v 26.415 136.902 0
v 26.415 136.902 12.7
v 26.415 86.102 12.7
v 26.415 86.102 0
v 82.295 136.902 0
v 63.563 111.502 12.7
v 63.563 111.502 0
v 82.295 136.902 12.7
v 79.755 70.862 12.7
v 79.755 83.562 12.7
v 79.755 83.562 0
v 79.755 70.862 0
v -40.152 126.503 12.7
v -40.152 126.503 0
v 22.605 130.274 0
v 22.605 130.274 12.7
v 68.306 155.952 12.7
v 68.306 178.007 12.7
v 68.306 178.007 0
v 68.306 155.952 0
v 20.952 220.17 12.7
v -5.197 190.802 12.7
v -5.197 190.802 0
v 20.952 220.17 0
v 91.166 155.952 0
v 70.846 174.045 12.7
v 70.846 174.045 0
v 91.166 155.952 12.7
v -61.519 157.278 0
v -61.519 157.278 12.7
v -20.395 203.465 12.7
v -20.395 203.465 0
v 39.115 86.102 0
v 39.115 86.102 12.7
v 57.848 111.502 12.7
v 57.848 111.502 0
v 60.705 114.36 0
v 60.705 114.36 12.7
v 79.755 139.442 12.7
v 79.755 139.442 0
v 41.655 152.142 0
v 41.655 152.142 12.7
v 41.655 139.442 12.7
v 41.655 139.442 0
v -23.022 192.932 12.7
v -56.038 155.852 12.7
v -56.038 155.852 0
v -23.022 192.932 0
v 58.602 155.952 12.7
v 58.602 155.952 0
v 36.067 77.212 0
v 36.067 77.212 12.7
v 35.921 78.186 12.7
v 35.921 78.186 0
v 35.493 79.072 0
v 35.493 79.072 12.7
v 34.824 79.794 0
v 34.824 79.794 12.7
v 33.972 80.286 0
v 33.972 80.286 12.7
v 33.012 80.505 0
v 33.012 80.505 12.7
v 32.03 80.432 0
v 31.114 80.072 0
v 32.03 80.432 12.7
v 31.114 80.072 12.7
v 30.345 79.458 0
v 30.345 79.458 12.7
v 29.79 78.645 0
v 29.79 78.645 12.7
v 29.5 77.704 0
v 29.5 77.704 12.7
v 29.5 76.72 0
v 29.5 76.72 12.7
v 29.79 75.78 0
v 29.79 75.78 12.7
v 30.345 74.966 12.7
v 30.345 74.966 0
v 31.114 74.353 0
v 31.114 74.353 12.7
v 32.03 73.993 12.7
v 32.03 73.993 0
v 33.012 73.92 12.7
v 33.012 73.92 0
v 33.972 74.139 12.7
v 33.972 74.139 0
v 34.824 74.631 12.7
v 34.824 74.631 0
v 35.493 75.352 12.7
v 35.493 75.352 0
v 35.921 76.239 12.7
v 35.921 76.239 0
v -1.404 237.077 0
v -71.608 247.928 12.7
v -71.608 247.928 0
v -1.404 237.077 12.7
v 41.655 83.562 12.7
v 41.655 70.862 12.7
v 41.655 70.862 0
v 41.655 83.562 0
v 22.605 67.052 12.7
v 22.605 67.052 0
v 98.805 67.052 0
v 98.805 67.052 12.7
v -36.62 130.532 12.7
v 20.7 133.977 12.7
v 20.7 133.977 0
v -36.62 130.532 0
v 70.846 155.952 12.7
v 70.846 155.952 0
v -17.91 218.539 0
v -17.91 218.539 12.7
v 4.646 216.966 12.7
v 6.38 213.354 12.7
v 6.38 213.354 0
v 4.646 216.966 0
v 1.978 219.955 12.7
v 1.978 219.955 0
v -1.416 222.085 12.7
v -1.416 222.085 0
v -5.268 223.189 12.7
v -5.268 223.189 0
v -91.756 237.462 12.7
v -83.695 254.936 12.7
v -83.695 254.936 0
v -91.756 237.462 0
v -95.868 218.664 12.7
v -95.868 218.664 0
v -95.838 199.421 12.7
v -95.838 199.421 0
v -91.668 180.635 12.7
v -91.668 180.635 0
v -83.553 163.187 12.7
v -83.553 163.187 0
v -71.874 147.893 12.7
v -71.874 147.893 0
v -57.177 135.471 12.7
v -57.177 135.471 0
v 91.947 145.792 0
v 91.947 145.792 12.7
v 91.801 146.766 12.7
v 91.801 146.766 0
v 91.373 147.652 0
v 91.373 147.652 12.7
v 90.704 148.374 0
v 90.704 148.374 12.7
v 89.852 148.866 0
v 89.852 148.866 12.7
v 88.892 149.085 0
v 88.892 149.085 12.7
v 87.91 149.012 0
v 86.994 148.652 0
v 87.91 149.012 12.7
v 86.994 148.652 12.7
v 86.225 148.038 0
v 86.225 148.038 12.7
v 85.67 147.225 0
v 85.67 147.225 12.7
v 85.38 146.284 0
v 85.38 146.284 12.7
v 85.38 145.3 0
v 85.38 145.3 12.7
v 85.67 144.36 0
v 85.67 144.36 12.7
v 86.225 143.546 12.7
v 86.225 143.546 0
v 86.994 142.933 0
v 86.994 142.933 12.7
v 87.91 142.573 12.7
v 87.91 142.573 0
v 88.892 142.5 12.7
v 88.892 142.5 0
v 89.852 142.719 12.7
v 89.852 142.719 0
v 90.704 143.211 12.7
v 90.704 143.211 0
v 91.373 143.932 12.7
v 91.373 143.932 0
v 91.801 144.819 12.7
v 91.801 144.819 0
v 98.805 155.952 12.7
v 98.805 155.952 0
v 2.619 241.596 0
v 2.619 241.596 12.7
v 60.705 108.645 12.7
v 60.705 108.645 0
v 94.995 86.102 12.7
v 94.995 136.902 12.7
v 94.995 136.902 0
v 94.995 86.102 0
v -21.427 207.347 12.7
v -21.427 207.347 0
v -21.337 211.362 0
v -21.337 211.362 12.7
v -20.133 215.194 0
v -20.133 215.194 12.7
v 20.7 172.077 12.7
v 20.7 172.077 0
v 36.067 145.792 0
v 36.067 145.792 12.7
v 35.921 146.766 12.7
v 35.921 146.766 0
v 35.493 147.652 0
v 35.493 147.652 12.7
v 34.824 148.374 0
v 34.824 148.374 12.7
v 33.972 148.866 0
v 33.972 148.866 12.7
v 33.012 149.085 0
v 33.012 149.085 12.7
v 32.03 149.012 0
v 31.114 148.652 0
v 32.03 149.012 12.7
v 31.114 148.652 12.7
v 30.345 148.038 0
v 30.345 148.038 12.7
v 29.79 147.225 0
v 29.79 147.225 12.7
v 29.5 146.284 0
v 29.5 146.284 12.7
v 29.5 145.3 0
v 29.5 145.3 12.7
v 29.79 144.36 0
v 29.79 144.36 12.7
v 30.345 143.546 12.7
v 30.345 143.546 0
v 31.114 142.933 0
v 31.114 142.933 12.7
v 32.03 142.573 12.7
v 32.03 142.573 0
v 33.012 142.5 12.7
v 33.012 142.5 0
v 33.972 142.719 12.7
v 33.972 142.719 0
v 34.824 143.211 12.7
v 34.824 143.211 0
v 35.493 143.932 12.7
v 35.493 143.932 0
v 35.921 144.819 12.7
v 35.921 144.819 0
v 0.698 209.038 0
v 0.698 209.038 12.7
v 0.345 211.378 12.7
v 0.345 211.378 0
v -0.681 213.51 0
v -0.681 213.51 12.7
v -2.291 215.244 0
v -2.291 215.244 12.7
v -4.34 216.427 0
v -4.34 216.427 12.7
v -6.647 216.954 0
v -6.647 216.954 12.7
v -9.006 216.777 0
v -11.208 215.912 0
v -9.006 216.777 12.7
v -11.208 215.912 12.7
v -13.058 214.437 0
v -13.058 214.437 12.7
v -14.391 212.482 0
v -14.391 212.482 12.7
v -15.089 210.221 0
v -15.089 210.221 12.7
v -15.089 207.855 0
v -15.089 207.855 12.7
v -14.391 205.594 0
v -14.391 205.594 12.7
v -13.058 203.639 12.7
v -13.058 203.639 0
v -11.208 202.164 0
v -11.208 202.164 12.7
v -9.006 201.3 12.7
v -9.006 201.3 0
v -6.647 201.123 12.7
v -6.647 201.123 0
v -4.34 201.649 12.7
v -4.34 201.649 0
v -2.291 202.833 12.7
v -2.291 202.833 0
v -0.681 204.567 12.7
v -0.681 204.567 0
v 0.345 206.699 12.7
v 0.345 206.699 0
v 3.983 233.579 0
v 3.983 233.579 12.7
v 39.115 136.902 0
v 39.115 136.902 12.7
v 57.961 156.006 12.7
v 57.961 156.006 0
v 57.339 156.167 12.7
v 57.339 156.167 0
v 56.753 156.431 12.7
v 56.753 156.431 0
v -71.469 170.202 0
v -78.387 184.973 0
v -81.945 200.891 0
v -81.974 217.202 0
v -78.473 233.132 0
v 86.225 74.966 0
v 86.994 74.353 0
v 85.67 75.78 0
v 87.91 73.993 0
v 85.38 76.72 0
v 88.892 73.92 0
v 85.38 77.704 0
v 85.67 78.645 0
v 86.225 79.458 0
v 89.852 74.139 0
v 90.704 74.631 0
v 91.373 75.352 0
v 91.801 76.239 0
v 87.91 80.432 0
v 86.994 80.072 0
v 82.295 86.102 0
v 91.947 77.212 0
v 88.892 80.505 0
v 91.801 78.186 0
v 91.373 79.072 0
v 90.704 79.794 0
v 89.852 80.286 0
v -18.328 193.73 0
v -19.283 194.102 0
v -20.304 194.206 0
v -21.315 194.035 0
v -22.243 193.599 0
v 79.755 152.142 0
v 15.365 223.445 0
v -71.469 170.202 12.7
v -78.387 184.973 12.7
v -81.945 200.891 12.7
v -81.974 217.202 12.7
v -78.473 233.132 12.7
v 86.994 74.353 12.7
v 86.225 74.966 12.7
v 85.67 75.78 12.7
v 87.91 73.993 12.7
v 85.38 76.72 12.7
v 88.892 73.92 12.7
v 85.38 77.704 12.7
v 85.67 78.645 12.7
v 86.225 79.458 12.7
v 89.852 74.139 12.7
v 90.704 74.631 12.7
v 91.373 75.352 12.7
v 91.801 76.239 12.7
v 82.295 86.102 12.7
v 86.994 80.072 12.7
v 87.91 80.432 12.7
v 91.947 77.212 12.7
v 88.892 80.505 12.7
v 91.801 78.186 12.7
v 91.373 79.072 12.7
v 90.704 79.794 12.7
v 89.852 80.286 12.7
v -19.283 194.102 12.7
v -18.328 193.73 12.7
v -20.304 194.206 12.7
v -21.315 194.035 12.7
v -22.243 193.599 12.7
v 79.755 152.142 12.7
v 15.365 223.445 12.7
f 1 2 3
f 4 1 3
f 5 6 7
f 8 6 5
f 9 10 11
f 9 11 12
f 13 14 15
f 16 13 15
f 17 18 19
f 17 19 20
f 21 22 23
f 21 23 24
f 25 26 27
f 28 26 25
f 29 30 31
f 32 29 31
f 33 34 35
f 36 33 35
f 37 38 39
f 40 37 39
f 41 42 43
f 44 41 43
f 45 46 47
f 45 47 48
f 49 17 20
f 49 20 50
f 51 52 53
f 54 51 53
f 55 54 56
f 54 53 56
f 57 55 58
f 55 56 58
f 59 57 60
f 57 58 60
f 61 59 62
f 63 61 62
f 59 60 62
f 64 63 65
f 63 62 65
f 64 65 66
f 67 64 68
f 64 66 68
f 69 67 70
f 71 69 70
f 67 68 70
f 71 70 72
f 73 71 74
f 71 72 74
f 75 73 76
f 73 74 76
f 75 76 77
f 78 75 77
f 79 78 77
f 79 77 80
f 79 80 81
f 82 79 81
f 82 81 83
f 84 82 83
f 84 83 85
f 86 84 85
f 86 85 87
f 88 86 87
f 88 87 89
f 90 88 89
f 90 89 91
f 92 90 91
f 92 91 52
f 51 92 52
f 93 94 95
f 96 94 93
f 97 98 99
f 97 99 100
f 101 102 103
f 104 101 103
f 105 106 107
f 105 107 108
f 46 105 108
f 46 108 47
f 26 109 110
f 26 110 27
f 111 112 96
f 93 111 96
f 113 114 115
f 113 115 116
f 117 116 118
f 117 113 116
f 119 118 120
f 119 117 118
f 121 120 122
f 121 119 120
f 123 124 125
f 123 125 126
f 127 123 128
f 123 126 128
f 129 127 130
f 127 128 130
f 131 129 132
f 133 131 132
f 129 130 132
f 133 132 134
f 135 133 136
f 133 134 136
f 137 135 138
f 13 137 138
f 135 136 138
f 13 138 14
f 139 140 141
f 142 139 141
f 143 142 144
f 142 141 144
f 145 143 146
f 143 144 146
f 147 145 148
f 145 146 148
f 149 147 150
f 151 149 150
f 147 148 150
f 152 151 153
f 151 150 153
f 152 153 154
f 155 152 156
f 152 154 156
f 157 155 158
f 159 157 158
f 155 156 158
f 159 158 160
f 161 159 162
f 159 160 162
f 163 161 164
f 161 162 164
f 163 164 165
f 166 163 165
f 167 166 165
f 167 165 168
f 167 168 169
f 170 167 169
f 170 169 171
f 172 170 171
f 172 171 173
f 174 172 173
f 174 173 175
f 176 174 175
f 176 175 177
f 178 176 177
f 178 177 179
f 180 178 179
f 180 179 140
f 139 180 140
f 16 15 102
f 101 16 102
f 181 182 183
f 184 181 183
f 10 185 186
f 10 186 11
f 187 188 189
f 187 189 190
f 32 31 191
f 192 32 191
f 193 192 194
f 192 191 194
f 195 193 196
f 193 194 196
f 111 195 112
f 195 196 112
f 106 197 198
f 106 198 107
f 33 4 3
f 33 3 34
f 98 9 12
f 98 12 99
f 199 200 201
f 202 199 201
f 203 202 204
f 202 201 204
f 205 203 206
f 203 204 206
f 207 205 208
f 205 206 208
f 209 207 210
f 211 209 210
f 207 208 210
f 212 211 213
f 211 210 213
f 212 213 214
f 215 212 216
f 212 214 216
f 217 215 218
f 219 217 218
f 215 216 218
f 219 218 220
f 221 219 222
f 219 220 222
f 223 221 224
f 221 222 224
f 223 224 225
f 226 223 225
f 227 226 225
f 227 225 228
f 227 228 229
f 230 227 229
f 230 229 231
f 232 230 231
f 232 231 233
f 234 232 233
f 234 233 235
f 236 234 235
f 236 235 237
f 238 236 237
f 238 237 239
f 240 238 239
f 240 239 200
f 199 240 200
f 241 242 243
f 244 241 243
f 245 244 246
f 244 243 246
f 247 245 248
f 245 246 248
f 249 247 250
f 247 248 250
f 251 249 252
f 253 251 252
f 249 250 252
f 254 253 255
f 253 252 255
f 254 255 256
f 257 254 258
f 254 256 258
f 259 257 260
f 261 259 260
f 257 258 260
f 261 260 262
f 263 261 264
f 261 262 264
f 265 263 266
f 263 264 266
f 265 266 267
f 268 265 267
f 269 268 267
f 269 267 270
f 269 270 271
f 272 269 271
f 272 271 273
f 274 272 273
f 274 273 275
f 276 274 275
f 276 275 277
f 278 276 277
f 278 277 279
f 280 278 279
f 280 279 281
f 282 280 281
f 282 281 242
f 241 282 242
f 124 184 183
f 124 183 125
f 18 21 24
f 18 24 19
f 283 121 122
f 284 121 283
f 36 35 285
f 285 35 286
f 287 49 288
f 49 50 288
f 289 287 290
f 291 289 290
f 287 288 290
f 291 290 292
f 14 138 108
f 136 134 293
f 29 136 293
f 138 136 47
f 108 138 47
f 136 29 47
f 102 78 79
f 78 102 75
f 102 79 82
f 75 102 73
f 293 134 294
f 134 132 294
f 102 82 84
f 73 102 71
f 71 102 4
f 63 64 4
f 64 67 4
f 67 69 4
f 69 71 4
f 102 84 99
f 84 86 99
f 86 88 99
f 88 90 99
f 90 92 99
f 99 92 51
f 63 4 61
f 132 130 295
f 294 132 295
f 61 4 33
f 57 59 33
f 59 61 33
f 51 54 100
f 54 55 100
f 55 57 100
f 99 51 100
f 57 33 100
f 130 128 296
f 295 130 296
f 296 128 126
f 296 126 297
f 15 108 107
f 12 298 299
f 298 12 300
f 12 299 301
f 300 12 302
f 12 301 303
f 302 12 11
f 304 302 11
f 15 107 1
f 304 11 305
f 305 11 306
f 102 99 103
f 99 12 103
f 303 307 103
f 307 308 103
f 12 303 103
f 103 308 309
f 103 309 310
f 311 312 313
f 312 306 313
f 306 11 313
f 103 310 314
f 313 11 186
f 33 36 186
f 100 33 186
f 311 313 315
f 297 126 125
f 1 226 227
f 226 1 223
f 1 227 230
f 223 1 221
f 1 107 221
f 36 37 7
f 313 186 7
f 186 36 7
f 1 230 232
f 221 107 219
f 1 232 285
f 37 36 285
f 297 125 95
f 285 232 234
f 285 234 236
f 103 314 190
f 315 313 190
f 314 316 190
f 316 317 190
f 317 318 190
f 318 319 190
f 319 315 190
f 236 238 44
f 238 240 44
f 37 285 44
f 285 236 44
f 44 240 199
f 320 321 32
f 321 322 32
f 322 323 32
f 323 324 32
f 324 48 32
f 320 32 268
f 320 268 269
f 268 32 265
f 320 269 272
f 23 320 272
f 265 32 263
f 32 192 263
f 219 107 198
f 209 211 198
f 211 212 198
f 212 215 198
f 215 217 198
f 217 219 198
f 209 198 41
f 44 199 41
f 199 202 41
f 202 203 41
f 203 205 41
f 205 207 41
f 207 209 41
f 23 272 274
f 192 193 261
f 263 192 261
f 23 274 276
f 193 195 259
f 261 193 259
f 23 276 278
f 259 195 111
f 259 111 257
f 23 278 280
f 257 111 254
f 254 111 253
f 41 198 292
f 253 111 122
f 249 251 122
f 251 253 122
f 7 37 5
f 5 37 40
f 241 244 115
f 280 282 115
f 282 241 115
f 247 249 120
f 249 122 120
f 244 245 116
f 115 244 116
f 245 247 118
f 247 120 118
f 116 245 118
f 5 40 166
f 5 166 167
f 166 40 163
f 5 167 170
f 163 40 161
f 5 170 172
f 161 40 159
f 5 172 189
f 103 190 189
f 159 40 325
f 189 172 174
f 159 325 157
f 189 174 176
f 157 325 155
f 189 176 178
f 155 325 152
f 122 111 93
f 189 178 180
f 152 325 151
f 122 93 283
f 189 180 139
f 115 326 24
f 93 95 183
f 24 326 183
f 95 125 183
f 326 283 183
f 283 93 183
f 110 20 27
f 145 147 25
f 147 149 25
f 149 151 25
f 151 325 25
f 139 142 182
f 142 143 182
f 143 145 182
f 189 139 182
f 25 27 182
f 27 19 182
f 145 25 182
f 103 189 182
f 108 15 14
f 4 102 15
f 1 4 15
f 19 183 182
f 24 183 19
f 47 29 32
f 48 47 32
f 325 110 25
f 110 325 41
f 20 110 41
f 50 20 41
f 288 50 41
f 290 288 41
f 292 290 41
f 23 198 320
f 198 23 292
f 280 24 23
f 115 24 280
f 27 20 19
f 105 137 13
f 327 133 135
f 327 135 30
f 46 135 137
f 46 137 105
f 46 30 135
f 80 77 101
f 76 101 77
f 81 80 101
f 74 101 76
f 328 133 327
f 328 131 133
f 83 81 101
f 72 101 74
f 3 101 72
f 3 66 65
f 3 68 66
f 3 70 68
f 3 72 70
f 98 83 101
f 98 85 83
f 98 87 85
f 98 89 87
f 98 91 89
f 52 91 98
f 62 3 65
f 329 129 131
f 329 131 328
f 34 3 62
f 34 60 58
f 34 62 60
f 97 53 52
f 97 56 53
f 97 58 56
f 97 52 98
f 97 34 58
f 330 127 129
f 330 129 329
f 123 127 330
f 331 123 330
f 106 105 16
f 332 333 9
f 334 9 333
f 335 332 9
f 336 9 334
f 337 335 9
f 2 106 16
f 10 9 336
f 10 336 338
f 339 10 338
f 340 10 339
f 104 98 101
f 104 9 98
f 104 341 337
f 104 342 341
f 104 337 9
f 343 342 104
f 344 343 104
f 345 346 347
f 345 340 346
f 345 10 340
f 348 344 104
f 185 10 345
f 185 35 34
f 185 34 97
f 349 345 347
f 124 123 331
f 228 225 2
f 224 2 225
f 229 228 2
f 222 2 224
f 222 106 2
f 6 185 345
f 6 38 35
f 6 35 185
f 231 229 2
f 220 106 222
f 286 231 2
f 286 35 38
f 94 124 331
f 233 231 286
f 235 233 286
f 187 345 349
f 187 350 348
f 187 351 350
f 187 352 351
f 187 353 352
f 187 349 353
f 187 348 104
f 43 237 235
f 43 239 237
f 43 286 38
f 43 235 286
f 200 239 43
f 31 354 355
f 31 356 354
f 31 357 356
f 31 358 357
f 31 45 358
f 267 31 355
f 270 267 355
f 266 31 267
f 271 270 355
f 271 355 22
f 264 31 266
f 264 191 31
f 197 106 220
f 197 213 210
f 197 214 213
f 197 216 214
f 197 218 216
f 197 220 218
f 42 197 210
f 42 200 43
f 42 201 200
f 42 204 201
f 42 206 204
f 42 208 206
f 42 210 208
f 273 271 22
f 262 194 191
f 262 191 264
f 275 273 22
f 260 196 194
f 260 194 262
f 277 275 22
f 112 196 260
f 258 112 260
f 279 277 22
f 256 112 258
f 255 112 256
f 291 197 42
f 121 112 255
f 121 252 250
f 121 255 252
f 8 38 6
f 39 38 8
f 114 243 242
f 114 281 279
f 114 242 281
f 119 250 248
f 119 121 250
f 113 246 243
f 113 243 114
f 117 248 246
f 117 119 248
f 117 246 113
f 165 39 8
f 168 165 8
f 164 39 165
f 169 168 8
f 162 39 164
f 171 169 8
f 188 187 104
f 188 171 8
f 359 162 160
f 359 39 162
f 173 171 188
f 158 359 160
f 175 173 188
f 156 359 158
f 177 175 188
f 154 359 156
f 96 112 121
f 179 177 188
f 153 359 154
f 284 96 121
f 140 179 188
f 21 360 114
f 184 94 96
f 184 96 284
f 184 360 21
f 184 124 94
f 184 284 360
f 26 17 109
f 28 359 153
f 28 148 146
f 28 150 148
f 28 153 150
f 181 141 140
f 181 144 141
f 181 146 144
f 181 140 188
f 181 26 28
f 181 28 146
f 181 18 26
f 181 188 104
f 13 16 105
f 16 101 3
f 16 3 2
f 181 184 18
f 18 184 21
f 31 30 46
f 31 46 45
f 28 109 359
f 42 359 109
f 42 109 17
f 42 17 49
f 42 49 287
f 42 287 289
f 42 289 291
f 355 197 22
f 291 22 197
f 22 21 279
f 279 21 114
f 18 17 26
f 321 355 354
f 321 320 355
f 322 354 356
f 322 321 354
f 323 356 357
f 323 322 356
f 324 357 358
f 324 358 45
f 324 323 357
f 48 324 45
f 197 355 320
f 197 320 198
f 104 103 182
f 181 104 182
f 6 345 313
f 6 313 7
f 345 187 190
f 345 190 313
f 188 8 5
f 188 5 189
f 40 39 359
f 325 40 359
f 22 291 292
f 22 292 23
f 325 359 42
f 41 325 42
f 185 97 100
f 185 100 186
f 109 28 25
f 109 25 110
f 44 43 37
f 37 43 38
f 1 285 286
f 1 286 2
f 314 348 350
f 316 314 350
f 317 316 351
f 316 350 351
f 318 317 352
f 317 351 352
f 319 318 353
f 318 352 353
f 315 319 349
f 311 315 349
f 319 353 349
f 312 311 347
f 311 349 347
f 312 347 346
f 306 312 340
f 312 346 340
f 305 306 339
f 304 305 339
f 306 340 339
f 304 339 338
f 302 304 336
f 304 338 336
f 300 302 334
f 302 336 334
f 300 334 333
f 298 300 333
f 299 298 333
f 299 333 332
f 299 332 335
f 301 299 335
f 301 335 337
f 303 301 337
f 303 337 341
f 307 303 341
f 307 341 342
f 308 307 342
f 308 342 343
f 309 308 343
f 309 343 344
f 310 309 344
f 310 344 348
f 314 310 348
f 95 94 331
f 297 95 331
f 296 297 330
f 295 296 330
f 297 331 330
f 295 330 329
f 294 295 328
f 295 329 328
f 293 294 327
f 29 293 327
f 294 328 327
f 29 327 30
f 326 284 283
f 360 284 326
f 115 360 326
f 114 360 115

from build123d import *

# Parameters (mm, degrees)
BOSS_EXTRUDE1_DEPTH = 12.7
SKETCH2_R           = 7.9375
CUT_EXTRUDE1_DEPTH  = 25.4
CUT_EXTRUDE2_DEPTH  = 15.24
CUT_EXTRUDE4_DEPTH  = 12.7
CUT_EXTRUDE3_DEPTH  = 12.7
FILLET4_R           = 3.81
CUT_EXTRUDE8_REACH  = 306.459
SKETCH10_R          = 3.302
CUT_EXTRUDE11_DEPTH = 12.7
BOSS_EXTRUDE2_DEPTH = 12.7


with BuildPart() as part:
    # Sketch1 → Boss-Extrude1 (new body)
    with BuildSketch(Plane.XY):
        with BuildLine():
            Line((22.605250022, 67.052290313), (98.805250022, 67.052290313))
            Line((98.805250022, 67.052290313), (98.805250022, 155.952290313))
            Line((98.805250022, 155.952290313), (-49.161223166, 287.699993186))
            ThreePointArc((-49.161223166, 287.699993186), (-96.236474745, 204.218681994), (-40.152034083, 126.502891159))
            Line((-40.152034083, 126.502891159), (22.605250022, 130.274128502))
            Line((22.605250022, 130.274128502), (22.605250022, 67.052290313))
        make_face()
    extrude(amount=BOSS_EXTRUDE1_DEPTH)

    # Sketch2 → Cut-Extrude1 (cut)
    with BuildSketch(Plane.XY.offset(12.7)):
        with Locations((-7.239749978, 209.038290313)):
            Circle(SKETCH2_R)
    extrude(amount=-CUT_EXTRUDE1_DEPTH, mode=Mode.SUBTRACT)

    # Sketch3 → Cut-Extrude2 (cut)
    with BuildSketch(Plane.XY.offset(12.7)):
        Polygon((41.655250022, 70.862290313), (41.655250022, 83.562290313), (60.705250022, 108.644790313), (79.755250022, 83.562290313), (79.755250022, 70.862290313), align=None)
        Polygon((26.415250022, 86.102290313), (39.115250022, 86.102290313), (57.847750022, 111.502290313), (39.115250022, 136.902290313), (26.415250022, 136.902290313), align=None)
        Polygon((94.995250022, 86.102290313), (82.295250022, 86.102290313), (63.562750022, 111.502290313), (82.295250022, 136.902290313), (94.995250022, 136.902290313), align=None)
        Polygon((41.655250022, 152.142290313), (41.655250022, 139.442290313), (60.705250022, 114.359790313), (79.755250022, 139.442290313), (79.755250022, 152.142290313), align=None)
    extrude(amount=-CUT_EXTRUDE2_DEPTH, mode=Mode.SUBTRACT)

    # Sketch5 → Cut-Extrude4 (cut)
    with BuildSketch(Plane.XY.offset(12.7)):
        with BuildLine():
            Line((-17.910409102, 218.539326578), (-0.75941726, 237.80168728))
            Line((-0.75941726, 237.80168728), (-42.818220106, 275.250377791))
            ThreePointArc((-42.818220106, 275.250377791), (-81.480920705, 220.910985735), (-61.519248594, 157.278402939))
            Line((-61.519248594, 157.278402939), (-20.395339746, 203.464861019))
            ThreePointArc((-20.395339746, 203.464861019), (-21.336998363, 211.362132865), (-17.910409102, 218.539326578))
        make_face()
        Polygon((-56.03788631, 155.851799386), (-36.620175939, 130.532002023), (20.700250022, 133.976525379), (20.700250022, 172.076525379), (-20.994230128, 195.20949671), align=None)
        with BuildLine():
            Line((3.983097906, 233.579004496), (-5.26797782, 223.189077245))
            ThreePointArc((-5.26797782, 223.189077245), (1.977645927, 219.954895508), (6.380422315, 213.353792944))
            Line((6.380422315, 213.353792944), (15.365134305, 223.444565813))
            Line((15.365134305, 223.444565813), (3.983097906, 233.579004496))
        make_face()
    extrude(amount=-CUT_EXTRUDE4_DEPTH, mode=Mode.SUBTRACT)

    # Sketch4 → Cut-Extrude3 (cut)
    with BuildSketch(Plane.XY.offset(12.7)):
        Polygon((57.615510223, 155.952290313), (-5.197073481, 190.802028044), (20.952186028, 220.170386062), (68.306030681, 178.007049188), (68.306030681, 155.952290313), align=None)
        Polygon((91.166030681, 155.952290313), (70.846030681, 155.952290313), (70.846030681, 174.044992428), align=None)
    extrude(amount=-CUT_EXTRUDE3_DEPTH, mode=Mode.SUBTRACT)

    # Fillet4
    fillet4_edges = [part.edges().sort_by_distance(p)[0] for p in [
        (-20.994230128, 195.20949671, 6.35),
        (57.615510223, 155.952290313, 6.35),
    ]]
    fillet(fillet4_edges, radius=FILLET4_R)

    # Sketch10 → Cut-Extrude8 (cut, up to next)
    with BuildSketch(Plane.XY.offset(12.7), mode=Mode.PRIVATE) as cut_extrude8_sk1:
        with Locations((32.765250022, 77.212290313)):
            Circle(SKETCH10_R)
    cut_extrude8_tool1 = extrude(cut_extrude8_sk1.sketch, amount=-CUT_EXTRUDE8_REACH, mode=Mode.PRIVATE) & part.part
    # Sketch10 → Cut-Extrude8 (cut, up to next)
    with BuildSketch(Plane.XY.offset(12.7), mode=Mode.PRIVATE) as cut_extrude8_sk2:
        with Locations((32.765250022, 145.792290313)):
            Circle(SKETCH10_R)
    cut_extrude8_tool2 = extrude(cut_extrude8_sk2.sketch, amount=-CUT_EXTRUDE8_REACH, mode=Mode.PRIVATE) & part.part
    # Sketch10 → Cut-Extrude8 (cut, up to next)
    with BuildSketch(Plane.XY.offset(12.7), mode=Mode.PRIVATE) as cut_extrude8_sk3:
        with Locations((88.645250022, 145.792290313)):
            Circle(SKETCH10_R)
    cut_extrude8_tool3 = extrude(cut_extrude8_sk3.sketch, amount=-CUT_EXTRUDE8_REACH, mode=Mode.PRIVATE) & part.part
    # Sketch10 → Cut-Extrude8 (cut, up to next)
    with BuildSketch(Plane.XY.offset(12.7), mode=Mode.PRIVATE) as cut_extrude8_sk4:
        with Locations((88.645250022, 77.212290313)):
            Circle(SKETCH10_R)
    cut_extrude8_tool4 = extrude(cut_extrude8_sk4.sketch, amount=-CUT_EXTRUDE8_REACH, mode=Mode.PRIVATE) & part.part
    add(cut_extrude8_tool1.solids().sort_by_distance((32.76525, 77.21229, 12.7))[0], mode=Mode.SUBTRACT)
    add(cut_extrude8_tool2.solids().sort_by_distance((32.76525, 145.79229, 12.7))[0], mode=Mode.SUBTRACT)
    add(cut_extrude8_tool3.solids().sort_by_distance((88.64525, 145.79229, 12.7))[0], mode=Mode.SUBTRACT)
    add(cut_extrude8_tool4.solids().sort_by_distance((88.64525, 77.21229, 12.7))[0], mode=Mode.SUBTRACT)

    # Sketch14 → Cut-Extrude11 (cut)
    with BuildSketch(Plane.XY.offset(12.7)):
        Polygon((-0.75941726, 237.80168728), (-90.284904, 256.297301642), (-56.503441725, 294.237422972), (2.618728967, 241.595699413), align=None)
    extrude(amount=-CUT_EXTRUDE11_DEPTH, mode=Mode.SUBTRACT)

    # Sketch15 → Boss-Extrude2 (add)
    with BuildSketch(Plane.XY.offset(12.7)):
        Polygon((2.618728967, 241.595699413), (-83.695447283, 254.935945734), (-84.471371658, 249.915553183), (-1.404499457, 237.07719239), align=None)
    extrude(amount=-BOSS_EXTRUDE2_DEPTH)


solid = part.part
